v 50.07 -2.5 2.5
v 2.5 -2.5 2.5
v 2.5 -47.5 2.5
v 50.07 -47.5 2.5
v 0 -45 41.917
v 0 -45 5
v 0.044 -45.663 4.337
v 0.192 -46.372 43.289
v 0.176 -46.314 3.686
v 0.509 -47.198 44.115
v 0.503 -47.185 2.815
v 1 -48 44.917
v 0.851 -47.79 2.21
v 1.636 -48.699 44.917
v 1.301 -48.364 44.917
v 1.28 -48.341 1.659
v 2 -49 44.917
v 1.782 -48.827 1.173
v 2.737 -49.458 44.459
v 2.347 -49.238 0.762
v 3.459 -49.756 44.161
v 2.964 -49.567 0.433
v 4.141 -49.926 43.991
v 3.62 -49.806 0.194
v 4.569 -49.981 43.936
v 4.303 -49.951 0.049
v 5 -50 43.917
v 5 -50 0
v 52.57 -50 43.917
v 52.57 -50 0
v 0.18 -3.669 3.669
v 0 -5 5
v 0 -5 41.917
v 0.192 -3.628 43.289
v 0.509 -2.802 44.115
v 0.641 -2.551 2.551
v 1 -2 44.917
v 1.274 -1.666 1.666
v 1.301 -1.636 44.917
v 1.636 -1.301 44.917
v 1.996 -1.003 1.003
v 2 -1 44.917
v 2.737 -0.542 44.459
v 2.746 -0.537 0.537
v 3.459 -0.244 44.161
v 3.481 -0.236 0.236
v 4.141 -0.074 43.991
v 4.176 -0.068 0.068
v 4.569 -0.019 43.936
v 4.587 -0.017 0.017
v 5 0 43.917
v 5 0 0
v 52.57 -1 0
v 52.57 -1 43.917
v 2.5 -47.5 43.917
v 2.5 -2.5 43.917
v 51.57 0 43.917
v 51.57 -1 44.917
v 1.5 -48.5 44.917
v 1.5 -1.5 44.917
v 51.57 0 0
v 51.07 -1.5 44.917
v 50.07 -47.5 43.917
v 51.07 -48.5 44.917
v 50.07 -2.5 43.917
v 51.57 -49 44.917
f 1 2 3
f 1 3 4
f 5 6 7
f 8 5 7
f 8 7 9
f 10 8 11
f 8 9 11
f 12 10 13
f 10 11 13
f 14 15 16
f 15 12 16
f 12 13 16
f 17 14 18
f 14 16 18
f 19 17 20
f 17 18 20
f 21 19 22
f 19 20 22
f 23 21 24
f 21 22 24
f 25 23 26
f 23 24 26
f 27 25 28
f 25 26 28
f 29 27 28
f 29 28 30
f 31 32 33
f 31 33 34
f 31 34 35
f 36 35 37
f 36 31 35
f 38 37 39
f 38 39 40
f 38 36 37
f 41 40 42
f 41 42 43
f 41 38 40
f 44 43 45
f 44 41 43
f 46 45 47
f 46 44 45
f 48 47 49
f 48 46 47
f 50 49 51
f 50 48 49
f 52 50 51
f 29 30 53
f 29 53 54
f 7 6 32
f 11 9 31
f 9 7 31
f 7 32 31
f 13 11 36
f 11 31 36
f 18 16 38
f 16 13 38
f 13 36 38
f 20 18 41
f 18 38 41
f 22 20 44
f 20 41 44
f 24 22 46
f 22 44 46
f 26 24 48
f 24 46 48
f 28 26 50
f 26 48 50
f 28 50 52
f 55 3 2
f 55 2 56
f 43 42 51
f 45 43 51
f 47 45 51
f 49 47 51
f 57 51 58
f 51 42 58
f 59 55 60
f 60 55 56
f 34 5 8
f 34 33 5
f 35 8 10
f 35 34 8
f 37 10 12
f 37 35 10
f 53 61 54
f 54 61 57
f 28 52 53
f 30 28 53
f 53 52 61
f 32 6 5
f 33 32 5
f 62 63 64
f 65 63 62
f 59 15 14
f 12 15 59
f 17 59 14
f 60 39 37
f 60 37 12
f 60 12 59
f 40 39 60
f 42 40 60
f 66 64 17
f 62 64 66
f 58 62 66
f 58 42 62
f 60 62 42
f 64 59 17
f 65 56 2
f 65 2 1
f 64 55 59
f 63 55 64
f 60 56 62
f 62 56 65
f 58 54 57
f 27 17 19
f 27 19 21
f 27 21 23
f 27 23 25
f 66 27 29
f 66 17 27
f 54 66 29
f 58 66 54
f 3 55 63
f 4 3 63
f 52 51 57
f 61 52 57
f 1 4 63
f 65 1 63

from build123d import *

# Parameters (mm, degrees)
F0_W        = 52.5702424347
F0_H        = 44.9169911444
F1_DEPTH    = 25
F2_DEPTH    = 25
F3_T        = -2.5
F4_SIZE     = 1
F5_T1_DEPTH = 68.9169911444
F5_T3_DEPTH = 6.1776694265
F5_T5_DEPTH = 48.0000001753
F5_T7_DEPTH = 6.1776694575
F5_T9_DEPTH = 75


# Not quite as in the source:
# - a fillet or chamfer that OpenCascade refuses, or shapes differently, is made with other operations: its cross-section is extruded or revolved along the edge and cut away or added


with BuildPart() as f1:
    # F0 (on Front) → F1 (new body)
    with BuildSketch(Plane.XZ):
        with Locations((26.2851212174, 22.4584955722)):
            Rectangle(F0_W, F0_H)
    extrude(amount=F1_DEPTH)

    # F2 (add): a face of the model
    f2_faces = [f1.faces().sort_by_distance(p)[0] for p in [
        (26.2851212174, -25, 22.4584955722),
    ]]
    extrude(f2_faces, amount=F2_DEPTH)

    # F3
    f3_openings = [f1.faces().sort_by_distance(p)[0] for p in [
        (26.285121, -25, 44.916991),
    ]]
    offset(amount=F3_T, openings=f3_openings)

    # F4
    f4_edges = [f1.edges().sort_by_distance(p)[0] for p in [
        (52.570242, 0, 22.458496),
        (52.570242, -25, 44.916991),
        (26.285121, -50, 44.916991),
        (0, -25, 44.916991),
        (26.285121, 0, 44.916991),
        (2.5, -25, 44.916991),
        (26.285121, -47.5, 44.916991),
        (50.070242, -25, 44.916991),
        (26.285121, -2.5, 44.916991),
    ]]
    chamfer(f4_edges, length=F4_SIZE)

    # F5: fillet of radius 5 on 4 edges, made by hand

    # F5_s2 → F5_t1 (cut)
    with BuildSketch(Plane.XY.offset(-12.5)):
        with BuildLine():
            ThreePointArc((0, -45), (1.4644660941, -48.5355339059), (5, -50))
            Line((5, -50), (0, -50))
            Line((0, -50), (0, -45))
        make_face()
        with BuildLine():
            ThreePointArc((0, -5), (1.4644660941, -1.4644660941), (5, 0))
            Line((5, 0), (0, 0))
            Line((0, 0), (0, -5))
        make_face()
    extrude(amount=F5_T1_DEPTH, mode=Mode.SUBTRACT)

    # F5_s4 → F5_t3 (cut)
    with BuildSketch(Plane.XZ.offset(49.0000001032)):
        with BuildLine():
            ThreePointArc((0, 41.8459233326), (0.3806023374, 43.7593404944), (1.4644660941, 45.3814572385))
            Line((1.4644660941, 45.3814572385), (0, 43.9169911444))
            Line((0, 43.9169911444), (0, 41.8459233326))
        make_face()
    extrude(amount=F5_T3_DEPTH, mode=Mode.SUBTRACT)

    # F5_s6 → F5_t5 (cut)
    with BuildSketch(Plane.XZ.offset(0.9999999279)):
        with BuildLine():
            ThreePointArc((0, 41.9169911444), (0.2565835097, 43.4981299745), (1, 44.9169911444))
            Line((1, 44.9169911444), (0, 43.9169911444))
            Line((0, 43.9169911444), (0, 41.9169911444))
        make_face()
    extrude(amount=F5_T5_DEPTH, mode=Mode.SUBTRACT)

    # F5_s8 → F5_t7 (cut)
    with BuildSketch(Plane.XZ.offset(-5.1776695297)):
        with BuildLine():
            ThreePointArc((0, 41.8459233326), (0.3806023374, 43.7593404944), (1.4644660941, 45.3814572385))
            Line((1.4644660941, 45.3814572385), (0, 43.9169911444))
            Line((0, 43.9169911444), (0, 41.8459233326))
        make_face()
    extrude(amount=F5_T7_DEPTH, mode=Mode.SUBTRACT)

    # F5_s10 → F5_t9 (cut)
    with BuildSketch(Plane.XZ.offset(-12.5)):
        with BuildLine():
            ThreePointArc((0, 5), (1.4644660941, 1.4644660941), (5, 0))
            Line((5, 0), (0, 0))
            Line((0, 0), (0, 5))
        make_face()
    extrude(amount=F5_T9_DEPTH, mode=Mode.SUBTRACT)


solid = f1.part
